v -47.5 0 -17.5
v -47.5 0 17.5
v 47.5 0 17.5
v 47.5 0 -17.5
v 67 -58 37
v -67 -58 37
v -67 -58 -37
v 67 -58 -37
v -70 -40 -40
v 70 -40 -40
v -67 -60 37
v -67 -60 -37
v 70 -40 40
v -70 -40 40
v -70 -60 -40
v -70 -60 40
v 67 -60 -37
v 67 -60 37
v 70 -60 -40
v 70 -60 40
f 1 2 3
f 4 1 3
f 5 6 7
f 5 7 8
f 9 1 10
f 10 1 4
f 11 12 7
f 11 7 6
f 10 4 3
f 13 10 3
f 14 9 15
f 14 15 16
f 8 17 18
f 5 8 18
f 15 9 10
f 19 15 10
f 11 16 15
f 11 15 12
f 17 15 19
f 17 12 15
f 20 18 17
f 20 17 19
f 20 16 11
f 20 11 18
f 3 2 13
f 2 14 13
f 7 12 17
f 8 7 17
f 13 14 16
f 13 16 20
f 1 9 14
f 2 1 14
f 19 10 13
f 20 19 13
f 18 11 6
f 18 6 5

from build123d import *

# Parameters (mm, degrees)
F0_W        = 140
F0_H        = 80
F1_DEPTH    = 60
F2_C1_SIZE2 = 22.5
F2_C1_SIZE  = 40
F2_C2_SIZE2 = 22.5
F2_C2_SIZE  = 40
F2_C3_SIZE2 = 40
F2_C3_SIZE  = 22.5
F2_C4_SIZE2 = 40
F2_C4_SIZE  = 22.5
F3_W        = 134
F3_H        = 74
F4_DEPTH    = 2
F5_DEPTH    = 2


with BuildPart() as f1:
    # F0 (on Front) → F1 (new body)
    with BuildSketch(Plane.XZ):
        Rectangle(F0_W, F0_H)
    extrude(amount=F1_DEPTH)

    # F2: chamfer of 22.5 x 40 on 4 edges, made by hand

    # F2_c1
    f2_c1_edges = [f1.edges().sort_by_distance(p)[0] for p in [
        (0, 0, -40),
    ]]
    f2_c1_side = f1.faces().sort_by_distance((0, -0.45, -40))[0]
    chamfer(f2_c1_edges, length=F2_C1_SIZE, length2=F2_C1_SIZE2, reference=f2_c1_side)

    # F2_c2
    f2_c2_edges = [f1.edges().sort_by_distance(p)[0] for p in [
        (70, 0, 11.25),
    ]]
    f2_c2_side = f1.faces().sort_by_distance((70, -0.45, 11.25))[0]
    chamfer(f2_c2_edges, length=F2_C2_SIZE, length2=F2_C2_SIZE2, reference=f2_c2_side)

    # F2_c3
    f2_c3_edges = [f1.edges().sort_by_distance(p)[0] for p in [
        (-11.25, 0, 40),
    ]]
    f2_c3_side = f1.faces().sort_by_distance((-11.25, 0, 39.55))[0]
    chamfer(f2_c3_edges, length=F2_C3_SIZE, length2=F2_C3_SIZE2, reference=f2_c3_side)

    # F2_c4
    f2_c4_edges = [f1.edges().sort_by_distance(p)[0] for p in [
        (-70, 0, 0),
    ]]
    f2_c4_side = f1.faces().sort_by_distance((-69.55, 0, 0))[0]
    chamfer(f2_c4_edges, length=F2_C4_SIZE, length2=F2_C4_SIZE2, reference=f2_c4_side)

    # F3 (on face) → F4 (join)
    with BuildSketch(Plane.XZ.offset(60)):
        Rectangle(F3_W, F3_H)
    extrude(amount=-F4_DEPTH)

    # F3 (on face) → F5 (cut)
    with BuildSketch(Plane.XZ.offset(60)):
        Rectangle(F3_W, F3_H)
    extrude(amount=-F5_DEPTH, mode=Mode.SUBTRACT)


solid = f1.part
